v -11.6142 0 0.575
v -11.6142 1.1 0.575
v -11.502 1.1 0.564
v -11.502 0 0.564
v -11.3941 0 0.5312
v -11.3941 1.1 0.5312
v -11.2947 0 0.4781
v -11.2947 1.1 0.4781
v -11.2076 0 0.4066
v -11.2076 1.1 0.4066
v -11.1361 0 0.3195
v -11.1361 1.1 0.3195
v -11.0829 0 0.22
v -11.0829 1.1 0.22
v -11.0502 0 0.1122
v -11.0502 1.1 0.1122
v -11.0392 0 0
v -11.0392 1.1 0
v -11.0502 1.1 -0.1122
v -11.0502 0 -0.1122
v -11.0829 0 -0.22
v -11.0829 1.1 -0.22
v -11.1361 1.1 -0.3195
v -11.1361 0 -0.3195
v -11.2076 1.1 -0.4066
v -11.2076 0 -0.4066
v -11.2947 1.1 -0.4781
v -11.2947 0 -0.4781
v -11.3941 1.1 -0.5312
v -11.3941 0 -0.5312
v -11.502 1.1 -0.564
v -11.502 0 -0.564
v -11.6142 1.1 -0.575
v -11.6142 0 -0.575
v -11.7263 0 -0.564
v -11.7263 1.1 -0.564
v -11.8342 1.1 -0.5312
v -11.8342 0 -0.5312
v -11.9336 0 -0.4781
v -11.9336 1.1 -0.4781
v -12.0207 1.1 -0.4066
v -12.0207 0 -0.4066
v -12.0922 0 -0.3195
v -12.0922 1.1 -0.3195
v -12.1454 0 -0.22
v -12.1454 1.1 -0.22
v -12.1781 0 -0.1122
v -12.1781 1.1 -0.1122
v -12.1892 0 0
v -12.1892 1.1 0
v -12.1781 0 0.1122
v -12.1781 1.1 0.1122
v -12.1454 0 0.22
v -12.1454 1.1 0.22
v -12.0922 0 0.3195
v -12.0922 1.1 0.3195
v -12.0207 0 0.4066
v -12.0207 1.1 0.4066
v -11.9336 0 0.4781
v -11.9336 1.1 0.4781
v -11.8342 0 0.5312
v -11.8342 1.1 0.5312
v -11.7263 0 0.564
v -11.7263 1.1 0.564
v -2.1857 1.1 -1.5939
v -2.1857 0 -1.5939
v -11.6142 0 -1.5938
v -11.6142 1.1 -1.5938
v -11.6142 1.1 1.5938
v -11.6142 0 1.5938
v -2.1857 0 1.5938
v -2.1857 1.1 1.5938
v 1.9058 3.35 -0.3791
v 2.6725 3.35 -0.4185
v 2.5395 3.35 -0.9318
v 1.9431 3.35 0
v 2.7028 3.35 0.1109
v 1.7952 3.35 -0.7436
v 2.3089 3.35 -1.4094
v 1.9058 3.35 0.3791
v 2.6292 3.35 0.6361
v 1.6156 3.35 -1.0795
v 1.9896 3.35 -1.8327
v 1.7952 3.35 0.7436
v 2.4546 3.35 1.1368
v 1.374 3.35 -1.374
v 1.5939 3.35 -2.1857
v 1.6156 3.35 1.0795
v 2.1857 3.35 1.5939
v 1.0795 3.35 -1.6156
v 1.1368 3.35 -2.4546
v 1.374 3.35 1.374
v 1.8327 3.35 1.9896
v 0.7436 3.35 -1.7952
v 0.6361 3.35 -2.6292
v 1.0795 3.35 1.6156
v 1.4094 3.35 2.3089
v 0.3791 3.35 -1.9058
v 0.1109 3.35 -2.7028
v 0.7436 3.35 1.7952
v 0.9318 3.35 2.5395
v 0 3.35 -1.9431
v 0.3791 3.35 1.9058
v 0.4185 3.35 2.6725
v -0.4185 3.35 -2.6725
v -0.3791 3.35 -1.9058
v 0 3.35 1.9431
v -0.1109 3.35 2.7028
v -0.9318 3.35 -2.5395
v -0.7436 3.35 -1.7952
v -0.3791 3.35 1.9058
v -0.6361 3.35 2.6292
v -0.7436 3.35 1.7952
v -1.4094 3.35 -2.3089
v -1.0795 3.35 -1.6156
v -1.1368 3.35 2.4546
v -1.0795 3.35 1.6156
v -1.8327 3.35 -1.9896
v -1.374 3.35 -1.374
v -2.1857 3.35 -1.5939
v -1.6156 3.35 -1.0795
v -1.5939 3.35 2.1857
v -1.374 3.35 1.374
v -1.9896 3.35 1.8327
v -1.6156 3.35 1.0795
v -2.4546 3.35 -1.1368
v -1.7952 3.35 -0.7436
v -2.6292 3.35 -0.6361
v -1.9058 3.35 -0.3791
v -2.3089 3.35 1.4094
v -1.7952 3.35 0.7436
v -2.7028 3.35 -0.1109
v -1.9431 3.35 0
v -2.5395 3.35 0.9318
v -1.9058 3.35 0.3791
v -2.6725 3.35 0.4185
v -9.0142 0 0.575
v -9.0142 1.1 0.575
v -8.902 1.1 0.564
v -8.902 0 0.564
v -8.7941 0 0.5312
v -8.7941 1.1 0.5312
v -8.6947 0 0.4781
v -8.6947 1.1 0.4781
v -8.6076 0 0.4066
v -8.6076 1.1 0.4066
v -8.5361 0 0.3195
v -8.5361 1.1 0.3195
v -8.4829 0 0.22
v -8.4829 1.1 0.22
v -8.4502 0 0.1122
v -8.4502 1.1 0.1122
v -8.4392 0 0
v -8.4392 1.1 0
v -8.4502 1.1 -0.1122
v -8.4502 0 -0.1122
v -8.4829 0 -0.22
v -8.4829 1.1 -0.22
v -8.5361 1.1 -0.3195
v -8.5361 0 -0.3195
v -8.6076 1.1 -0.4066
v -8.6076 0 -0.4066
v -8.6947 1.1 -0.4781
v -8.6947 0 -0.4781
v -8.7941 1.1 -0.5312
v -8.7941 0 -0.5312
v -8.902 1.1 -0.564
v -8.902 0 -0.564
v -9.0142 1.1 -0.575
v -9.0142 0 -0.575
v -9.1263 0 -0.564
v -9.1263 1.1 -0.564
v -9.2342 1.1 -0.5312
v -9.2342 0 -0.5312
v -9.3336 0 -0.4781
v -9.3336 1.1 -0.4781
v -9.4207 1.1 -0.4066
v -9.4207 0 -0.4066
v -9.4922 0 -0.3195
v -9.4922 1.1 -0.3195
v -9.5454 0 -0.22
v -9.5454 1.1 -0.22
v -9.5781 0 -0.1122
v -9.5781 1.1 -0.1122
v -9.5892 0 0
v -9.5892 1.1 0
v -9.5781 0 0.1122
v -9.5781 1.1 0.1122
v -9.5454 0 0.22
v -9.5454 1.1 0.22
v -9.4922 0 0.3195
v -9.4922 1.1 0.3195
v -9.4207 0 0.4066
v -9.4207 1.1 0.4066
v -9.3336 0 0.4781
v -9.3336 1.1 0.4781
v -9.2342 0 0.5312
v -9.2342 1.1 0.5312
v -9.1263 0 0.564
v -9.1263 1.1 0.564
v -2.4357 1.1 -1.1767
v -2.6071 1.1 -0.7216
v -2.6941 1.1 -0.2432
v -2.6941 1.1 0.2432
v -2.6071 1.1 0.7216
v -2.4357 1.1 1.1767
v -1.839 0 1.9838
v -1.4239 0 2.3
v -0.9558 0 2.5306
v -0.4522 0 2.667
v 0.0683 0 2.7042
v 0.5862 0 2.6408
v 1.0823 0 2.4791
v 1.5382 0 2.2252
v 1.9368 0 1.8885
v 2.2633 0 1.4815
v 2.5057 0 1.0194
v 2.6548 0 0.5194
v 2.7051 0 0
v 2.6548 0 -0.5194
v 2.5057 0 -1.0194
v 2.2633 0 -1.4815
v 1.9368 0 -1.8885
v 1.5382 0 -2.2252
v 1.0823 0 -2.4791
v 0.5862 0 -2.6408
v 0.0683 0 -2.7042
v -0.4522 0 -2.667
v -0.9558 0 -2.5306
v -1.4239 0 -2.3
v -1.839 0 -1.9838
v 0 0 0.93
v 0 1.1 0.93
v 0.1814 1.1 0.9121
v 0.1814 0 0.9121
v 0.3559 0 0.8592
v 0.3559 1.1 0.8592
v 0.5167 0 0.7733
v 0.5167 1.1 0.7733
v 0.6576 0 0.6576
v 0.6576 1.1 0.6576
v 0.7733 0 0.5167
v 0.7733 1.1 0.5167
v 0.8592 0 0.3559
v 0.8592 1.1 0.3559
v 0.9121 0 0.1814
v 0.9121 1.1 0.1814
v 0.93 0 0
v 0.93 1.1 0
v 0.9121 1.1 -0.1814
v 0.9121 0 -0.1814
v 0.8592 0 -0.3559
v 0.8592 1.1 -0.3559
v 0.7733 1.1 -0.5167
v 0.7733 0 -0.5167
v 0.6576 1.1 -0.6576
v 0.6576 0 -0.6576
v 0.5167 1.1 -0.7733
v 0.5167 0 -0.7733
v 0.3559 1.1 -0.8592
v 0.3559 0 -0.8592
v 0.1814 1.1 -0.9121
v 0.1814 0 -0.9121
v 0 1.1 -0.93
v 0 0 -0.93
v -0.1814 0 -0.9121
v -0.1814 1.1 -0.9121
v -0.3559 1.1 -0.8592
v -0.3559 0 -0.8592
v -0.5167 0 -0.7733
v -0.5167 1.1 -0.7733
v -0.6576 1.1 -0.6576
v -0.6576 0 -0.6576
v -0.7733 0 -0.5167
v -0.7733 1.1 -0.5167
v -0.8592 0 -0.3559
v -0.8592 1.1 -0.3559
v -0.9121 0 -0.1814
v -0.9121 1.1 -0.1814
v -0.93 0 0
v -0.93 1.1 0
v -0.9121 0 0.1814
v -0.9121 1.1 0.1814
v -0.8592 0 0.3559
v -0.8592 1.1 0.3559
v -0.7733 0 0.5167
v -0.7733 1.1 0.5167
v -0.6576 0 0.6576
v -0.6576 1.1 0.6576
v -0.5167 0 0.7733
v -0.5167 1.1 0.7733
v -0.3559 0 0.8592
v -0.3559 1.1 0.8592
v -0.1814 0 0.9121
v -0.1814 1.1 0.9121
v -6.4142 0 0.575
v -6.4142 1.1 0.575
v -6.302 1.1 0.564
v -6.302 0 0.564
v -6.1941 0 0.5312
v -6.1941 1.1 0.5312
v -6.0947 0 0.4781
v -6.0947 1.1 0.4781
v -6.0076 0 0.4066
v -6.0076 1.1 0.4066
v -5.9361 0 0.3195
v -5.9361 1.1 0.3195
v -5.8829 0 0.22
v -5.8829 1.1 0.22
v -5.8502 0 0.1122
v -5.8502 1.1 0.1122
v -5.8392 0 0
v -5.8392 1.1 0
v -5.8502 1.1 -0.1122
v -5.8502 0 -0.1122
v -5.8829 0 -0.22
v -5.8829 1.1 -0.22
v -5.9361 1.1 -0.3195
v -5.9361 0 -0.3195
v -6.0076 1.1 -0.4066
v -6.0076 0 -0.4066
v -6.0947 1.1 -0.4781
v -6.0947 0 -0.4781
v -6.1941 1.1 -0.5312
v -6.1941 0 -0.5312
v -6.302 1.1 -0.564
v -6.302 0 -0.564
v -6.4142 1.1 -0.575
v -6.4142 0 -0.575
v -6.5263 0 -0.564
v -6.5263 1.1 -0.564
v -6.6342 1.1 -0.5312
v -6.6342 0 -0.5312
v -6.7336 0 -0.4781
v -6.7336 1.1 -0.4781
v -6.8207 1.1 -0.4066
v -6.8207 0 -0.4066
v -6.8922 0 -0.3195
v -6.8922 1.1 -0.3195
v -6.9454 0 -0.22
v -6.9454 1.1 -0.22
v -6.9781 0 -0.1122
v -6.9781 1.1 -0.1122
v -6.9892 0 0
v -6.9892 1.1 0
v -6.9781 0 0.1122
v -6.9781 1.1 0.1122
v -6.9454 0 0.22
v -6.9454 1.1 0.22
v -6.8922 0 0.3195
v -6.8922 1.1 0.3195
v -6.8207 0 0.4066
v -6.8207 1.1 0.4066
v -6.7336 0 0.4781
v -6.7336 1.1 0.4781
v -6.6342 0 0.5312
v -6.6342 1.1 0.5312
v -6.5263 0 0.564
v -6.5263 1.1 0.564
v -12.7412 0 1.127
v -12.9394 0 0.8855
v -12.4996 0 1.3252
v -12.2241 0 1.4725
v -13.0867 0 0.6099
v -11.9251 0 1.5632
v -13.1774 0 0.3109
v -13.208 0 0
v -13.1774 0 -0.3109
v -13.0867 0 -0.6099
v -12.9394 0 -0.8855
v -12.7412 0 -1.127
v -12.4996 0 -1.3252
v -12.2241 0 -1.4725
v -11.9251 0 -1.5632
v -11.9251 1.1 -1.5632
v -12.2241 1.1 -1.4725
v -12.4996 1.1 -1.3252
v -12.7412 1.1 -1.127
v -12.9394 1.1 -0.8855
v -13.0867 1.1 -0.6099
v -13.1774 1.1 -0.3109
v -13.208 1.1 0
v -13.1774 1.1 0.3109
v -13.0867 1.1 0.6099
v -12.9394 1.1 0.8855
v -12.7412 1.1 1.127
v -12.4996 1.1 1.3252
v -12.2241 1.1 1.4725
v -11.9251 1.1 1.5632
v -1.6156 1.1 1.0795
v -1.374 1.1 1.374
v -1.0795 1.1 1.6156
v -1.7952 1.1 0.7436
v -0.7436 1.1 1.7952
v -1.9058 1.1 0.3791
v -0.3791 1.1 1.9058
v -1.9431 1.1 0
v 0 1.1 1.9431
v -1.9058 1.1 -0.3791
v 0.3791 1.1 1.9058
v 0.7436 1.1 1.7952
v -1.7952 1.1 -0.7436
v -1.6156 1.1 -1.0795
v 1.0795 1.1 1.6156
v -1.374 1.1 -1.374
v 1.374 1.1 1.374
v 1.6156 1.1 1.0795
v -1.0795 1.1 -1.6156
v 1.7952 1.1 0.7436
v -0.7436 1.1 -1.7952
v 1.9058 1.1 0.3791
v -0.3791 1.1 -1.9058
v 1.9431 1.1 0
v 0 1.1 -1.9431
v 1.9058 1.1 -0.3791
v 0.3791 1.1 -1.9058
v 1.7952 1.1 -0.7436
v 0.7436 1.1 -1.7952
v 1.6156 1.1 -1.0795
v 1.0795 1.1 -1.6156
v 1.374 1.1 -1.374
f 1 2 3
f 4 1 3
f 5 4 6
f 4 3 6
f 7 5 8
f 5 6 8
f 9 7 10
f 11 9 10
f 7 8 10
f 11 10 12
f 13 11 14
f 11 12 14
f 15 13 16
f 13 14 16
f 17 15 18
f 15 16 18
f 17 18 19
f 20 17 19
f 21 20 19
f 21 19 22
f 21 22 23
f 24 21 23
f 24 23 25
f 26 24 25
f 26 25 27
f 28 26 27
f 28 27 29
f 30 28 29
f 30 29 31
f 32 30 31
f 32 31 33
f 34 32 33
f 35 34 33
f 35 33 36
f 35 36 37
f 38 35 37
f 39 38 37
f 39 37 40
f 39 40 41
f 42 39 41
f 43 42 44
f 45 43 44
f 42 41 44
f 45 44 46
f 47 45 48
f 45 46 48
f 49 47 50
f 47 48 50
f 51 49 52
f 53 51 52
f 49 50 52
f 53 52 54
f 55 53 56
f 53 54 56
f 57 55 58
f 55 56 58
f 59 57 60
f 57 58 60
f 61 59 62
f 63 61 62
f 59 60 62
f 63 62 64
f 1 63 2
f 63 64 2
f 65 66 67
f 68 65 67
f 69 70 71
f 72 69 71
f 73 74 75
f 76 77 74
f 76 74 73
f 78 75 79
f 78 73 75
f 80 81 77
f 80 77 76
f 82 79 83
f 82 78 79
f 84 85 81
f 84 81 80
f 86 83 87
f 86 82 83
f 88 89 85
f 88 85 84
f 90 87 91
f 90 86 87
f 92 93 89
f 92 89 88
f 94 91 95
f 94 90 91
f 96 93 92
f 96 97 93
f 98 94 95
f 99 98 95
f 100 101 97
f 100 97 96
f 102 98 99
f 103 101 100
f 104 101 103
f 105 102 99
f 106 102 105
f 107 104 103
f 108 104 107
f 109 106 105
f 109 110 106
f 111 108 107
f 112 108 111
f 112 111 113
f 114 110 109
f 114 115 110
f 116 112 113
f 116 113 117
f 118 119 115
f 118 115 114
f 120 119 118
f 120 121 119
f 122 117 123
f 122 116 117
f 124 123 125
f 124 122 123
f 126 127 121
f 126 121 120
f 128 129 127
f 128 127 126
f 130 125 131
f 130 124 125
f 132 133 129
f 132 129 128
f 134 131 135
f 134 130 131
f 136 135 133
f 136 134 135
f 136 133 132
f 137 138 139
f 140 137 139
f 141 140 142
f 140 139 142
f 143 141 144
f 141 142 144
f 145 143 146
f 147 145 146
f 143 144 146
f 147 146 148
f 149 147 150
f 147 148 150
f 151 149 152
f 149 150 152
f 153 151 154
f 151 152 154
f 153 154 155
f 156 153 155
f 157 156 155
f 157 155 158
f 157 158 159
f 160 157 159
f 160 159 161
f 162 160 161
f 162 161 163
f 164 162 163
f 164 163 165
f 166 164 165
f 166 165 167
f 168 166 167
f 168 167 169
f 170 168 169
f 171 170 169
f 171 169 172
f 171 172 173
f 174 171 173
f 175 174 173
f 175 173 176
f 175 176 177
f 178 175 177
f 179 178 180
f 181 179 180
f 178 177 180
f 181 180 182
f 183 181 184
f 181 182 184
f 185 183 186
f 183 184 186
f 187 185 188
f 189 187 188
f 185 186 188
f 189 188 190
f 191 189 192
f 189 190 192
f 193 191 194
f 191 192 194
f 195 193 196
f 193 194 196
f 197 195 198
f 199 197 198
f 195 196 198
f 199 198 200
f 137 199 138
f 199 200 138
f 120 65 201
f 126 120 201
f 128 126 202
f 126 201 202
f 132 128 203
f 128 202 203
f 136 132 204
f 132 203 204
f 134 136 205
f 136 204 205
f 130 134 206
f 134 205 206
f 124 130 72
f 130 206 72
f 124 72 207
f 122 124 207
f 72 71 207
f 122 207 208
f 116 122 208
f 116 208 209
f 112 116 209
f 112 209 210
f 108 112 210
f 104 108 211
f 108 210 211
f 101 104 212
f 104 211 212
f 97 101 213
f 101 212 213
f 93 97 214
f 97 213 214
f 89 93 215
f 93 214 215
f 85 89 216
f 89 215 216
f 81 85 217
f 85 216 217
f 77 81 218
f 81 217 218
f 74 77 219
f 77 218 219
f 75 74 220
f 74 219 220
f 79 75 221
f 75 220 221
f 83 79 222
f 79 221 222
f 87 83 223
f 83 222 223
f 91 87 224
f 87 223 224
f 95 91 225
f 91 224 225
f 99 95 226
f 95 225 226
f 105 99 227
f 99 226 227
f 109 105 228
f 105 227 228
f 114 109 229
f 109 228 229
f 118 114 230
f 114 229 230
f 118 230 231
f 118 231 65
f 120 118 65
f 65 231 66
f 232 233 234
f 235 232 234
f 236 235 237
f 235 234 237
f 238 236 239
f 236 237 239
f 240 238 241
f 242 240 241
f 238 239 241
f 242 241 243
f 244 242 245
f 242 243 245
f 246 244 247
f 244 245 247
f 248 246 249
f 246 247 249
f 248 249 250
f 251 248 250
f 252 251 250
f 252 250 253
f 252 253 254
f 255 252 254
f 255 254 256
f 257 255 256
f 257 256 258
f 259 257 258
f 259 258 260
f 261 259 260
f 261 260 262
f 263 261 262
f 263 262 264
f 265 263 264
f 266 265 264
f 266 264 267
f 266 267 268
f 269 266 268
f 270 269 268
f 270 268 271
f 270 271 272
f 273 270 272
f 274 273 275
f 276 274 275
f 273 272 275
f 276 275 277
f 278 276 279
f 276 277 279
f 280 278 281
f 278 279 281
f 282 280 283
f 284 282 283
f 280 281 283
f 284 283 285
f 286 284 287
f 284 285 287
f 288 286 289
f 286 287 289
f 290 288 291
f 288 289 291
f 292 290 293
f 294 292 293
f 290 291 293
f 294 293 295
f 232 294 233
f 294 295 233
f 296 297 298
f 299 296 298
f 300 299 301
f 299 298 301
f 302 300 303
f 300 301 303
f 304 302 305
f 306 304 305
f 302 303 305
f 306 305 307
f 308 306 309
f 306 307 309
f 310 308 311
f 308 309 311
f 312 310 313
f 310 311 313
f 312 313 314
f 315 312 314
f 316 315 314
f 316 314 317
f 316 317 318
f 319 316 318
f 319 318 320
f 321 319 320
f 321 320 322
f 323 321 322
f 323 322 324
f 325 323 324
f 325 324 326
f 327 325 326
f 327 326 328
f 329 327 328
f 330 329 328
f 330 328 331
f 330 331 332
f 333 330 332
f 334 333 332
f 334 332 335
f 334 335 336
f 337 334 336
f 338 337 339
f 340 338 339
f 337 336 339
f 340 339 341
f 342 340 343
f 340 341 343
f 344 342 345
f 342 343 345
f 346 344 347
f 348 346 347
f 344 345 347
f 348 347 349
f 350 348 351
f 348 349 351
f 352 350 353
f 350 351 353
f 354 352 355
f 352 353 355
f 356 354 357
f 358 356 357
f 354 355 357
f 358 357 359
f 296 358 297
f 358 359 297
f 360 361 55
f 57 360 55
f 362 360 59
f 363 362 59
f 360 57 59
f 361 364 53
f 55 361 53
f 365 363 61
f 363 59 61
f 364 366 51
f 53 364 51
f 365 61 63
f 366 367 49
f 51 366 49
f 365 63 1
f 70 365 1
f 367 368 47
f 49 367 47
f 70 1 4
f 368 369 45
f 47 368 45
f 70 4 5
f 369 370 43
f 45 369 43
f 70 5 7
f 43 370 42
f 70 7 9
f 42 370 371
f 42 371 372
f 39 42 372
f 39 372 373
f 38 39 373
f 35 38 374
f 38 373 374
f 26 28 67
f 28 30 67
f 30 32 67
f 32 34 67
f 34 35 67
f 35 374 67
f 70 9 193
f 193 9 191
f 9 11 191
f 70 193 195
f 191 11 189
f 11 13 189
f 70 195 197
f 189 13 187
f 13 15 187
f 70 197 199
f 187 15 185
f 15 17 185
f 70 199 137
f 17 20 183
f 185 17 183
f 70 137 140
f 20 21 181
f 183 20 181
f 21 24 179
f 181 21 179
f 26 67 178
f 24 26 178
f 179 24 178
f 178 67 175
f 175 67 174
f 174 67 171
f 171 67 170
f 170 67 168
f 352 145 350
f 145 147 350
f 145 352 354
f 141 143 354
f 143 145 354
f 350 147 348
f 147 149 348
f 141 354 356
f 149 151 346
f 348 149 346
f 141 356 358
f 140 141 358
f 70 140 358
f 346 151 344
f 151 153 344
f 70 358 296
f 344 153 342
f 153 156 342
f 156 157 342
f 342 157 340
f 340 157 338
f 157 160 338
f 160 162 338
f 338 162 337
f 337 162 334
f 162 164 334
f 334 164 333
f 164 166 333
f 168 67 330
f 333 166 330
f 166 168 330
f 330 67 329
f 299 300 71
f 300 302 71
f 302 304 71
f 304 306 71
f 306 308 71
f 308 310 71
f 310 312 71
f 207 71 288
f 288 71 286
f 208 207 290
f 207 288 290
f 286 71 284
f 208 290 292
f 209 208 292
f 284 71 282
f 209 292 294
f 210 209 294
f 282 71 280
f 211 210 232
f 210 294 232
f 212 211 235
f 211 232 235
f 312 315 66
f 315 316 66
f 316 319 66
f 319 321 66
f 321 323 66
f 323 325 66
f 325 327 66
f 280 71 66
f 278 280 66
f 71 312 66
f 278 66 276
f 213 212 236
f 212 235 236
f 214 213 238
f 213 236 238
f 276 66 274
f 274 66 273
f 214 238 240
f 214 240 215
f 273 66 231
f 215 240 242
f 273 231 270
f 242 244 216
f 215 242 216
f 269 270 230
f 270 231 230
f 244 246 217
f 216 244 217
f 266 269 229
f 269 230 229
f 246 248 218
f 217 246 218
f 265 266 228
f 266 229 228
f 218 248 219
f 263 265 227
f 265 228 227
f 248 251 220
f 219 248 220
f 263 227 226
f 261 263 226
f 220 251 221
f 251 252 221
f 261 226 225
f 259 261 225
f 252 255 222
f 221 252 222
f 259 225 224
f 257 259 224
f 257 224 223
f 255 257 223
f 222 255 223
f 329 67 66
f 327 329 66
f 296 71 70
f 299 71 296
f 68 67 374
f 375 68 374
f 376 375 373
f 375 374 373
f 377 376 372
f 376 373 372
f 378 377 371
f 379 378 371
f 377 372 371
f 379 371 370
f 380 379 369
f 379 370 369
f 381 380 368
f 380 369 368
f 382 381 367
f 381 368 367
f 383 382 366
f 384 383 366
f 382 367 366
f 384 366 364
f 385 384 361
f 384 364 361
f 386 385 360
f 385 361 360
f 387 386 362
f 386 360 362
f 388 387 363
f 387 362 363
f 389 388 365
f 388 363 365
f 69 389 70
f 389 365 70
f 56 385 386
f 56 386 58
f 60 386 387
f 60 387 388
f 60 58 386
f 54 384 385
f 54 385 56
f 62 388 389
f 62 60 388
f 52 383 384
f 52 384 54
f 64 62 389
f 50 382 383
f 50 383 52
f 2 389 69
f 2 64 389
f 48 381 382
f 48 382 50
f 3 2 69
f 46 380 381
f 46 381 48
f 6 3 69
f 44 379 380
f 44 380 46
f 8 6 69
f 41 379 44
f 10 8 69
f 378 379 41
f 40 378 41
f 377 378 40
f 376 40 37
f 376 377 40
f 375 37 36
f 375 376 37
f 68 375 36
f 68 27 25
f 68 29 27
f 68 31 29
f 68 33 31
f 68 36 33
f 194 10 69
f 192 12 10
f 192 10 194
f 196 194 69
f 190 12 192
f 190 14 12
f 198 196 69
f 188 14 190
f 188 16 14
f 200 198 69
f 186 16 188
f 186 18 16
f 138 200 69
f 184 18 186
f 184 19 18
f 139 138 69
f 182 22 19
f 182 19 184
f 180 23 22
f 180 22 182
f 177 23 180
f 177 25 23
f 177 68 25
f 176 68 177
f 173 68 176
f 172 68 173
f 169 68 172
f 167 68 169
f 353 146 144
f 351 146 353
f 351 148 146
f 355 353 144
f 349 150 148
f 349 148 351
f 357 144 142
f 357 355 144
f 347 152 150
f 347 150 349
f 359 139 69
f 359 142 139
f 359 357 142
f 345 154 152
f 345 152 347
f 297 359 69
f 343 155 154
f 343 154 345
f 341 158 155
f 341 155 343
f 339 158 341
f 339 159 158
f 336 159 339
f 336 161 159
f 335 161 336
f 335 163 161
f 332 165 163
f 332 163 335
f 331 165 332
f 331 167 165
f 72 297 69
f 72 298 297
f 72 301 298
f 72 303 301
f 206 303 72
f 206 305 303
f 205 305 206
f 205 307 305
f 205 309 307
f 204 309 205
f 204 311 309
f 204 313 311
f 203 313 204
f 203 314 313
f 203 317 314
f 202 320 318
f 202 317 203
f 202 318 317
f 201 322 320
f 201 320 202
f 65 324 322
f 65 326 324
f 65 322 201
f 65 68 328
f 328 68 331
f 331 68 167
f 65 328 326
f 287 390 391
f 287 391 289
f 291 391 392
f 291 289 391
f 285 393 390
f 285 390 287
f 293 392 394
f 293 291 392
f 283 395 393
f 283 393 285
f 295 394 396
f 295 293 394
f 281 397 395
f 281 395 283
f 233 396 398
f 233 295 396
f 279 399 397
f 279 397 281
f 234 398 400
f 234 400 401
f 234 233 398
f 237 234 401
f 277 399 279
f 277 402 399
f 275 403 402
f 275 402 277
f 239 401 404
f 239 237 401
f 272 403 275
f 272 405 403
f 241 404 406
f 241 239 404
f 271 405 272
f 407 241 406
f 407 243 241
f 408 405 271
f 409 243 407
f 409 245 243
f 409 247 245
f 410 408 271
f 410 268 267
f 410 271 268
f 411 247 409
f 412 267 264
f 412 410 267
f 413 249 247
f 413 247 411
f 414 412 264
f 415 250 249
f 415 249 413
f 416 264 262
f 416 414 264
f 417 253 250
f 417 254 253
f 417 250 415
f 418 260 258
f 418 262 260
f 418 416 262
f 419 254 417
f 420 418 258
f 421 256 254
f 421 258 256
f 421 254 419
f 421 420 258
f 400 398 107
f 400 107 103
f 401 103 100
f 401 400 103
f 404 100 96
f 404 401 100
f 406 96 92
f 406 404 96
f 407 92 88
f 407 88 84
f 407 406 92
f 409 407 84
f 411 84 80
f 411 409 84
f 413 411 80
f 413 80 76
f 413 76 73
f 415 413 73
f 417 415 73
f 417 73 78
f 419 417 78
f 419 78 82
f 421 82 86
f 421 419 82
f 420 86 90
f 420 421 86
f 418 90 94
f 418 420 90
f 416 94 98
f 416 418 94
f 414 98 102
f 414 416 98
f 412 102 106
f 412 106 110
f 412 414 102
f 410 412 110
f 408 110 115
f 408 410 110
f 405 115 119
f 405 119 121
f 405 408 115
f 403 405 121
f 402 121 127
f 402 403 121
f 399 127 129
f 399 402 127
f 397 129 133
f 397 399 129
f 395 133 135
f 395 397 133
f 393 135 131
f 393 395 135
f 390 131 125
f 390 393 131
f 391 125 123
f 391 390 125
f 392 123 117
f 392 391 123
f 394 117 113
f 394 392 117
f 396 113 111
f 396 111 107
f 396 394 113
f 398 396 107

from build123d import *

# Parameters (mm, degrees)
BOSS_EXTRUDE1_DEPTH = 1.1
SKETCH2_R           = 2.7051
SKETCH2_R_2         = 1.9431
BOSS_EXTRUDE2_DEPTH = 2.25
SKETCH3_R           = 0.930000045
CUT_EXTRUDE1_DEPTH  = 14.668625754
CUT_EXTRUDE2_REACH  = 15.669
SKETCH4_R           = 0.575


with BuildPart() as part:
    # Sketch1 → Boss-Extrude1 (new body)
    with BuildSketch(Plane(origin=(0, 0, 0), x_dir=(1, 0, 0), z_dir=(0, 1, 0))):
        with BuildLine():
            Line((-2.185682545, 1.59385), (-11.61415, 1.59385))
            ThreePointArc((-11.61415, 1.59385), (-13.208, 0), (-11.61415, -1.59385))
            Line((-11.61415, -1.59385), (-2.185682545, -1.59385))
            ThreePointArc((-2.185682545, -1.59385), (2.7051, 0), (-2.185682545, 1.59385))
        make_face()
    extrude(amount=BOSS_EXTRUDE1_DEPTH)

    # Sketch2 → Boss-Extrude2 (add)
    with BuildSketch(Plane(origin=(0, 1.1, 0), x_dir=(1, 0, 0), z_dir=(0, 1, 0))):
        Circle(SKETCH2_R)
        Circle(SKETCH2_R_2, mode=Mode.SUBTRACT)
    extrude(amount=BOSS_EXTRUDE2_DEPTH)

    # Sketch3 → Cut-Extrude1 (cut, through all)
    with BuildSketch(Plane(origin=(0, 1.1, 0), x_dir=(1, 0, 0), z_dir=(0, 1, 0))):
        Circle(SKETCH3_R)
    extrude(amount=-CUT_EXTRUDE1_DEPTH, mode=Mode.SUBTRACT)

    # Sketch4 → Cut-Extrude2 (cut, up to next)
    with BuildSketch(Plane(origin=(0, 1.1, 0), x_dir=(1, 0, 0), z_dir=(0, 1, 0)), mode=Mode.PRIVATE) as cut_extrude2_sk1:
        with Locations((-11.61415, 0)):
            Circle(SKETCH4_R)
    cut_extrude2_tool1 = extrude(cut_extrude2_sk1.sketch, amount=-CUT_EXTRUDE2_REACH, mode=Mode.PRIVATE) & part.part
    # Sketch4 → Cut-Extrude2 (cut, up to next)
    with BuildSketch(Plane(origin=(0, 1.1, 0), x_dir=(1, 0, 0), z_dir=(0, 1, 0)), mode=Mode.PRIVATE) as cut_extrude2_sk2:
        with Locations((-9.01415, 0)):
            Circle(SKETCH4_R)
    cut_extrude2_tool2 = extrude(cut_extrude2_sk2.sketch, amount=-CUT_EXTRUDE2_REACH, mode=Mode.PRIVATE) & part.part
    # Sketch4 → Cut-Extrude2 (cut, up to next)
    with BuildSketch(Plane(origin=(0, 1.1, 0), x_dir=(1, 0, 0), z_dir=(0, 1, 0)), mode=Mode.PRIVATE) as cut_extrude2_sk3:
        with Locations((-6.41415, 0)):
            Circle(SKETCH4_R)
    cut_extrude2_tool3 = extrude(cut_extrude2_sk3.sketch, amount=-CUT_EXTRUDE2_REACH, mode=Mode.PRIVATE) & part.part
    add(cut_extrude2_tool1.solids().sort_by_distance((-11.61415, 1.1, 0))[0], mode=Mode.SUBTRACT)
    add(cut_extrude2_tool2.solids().sort_by_distance((-9.01415, 1.1, 0))[0], mode=Mode.SUBTRACT)
    add(cut_extrude2_tool3.solids().sort_by_distance((-6.41415, 1.1, 0))[0], mode=Mode.SUBTRACT)


solid = part.part
